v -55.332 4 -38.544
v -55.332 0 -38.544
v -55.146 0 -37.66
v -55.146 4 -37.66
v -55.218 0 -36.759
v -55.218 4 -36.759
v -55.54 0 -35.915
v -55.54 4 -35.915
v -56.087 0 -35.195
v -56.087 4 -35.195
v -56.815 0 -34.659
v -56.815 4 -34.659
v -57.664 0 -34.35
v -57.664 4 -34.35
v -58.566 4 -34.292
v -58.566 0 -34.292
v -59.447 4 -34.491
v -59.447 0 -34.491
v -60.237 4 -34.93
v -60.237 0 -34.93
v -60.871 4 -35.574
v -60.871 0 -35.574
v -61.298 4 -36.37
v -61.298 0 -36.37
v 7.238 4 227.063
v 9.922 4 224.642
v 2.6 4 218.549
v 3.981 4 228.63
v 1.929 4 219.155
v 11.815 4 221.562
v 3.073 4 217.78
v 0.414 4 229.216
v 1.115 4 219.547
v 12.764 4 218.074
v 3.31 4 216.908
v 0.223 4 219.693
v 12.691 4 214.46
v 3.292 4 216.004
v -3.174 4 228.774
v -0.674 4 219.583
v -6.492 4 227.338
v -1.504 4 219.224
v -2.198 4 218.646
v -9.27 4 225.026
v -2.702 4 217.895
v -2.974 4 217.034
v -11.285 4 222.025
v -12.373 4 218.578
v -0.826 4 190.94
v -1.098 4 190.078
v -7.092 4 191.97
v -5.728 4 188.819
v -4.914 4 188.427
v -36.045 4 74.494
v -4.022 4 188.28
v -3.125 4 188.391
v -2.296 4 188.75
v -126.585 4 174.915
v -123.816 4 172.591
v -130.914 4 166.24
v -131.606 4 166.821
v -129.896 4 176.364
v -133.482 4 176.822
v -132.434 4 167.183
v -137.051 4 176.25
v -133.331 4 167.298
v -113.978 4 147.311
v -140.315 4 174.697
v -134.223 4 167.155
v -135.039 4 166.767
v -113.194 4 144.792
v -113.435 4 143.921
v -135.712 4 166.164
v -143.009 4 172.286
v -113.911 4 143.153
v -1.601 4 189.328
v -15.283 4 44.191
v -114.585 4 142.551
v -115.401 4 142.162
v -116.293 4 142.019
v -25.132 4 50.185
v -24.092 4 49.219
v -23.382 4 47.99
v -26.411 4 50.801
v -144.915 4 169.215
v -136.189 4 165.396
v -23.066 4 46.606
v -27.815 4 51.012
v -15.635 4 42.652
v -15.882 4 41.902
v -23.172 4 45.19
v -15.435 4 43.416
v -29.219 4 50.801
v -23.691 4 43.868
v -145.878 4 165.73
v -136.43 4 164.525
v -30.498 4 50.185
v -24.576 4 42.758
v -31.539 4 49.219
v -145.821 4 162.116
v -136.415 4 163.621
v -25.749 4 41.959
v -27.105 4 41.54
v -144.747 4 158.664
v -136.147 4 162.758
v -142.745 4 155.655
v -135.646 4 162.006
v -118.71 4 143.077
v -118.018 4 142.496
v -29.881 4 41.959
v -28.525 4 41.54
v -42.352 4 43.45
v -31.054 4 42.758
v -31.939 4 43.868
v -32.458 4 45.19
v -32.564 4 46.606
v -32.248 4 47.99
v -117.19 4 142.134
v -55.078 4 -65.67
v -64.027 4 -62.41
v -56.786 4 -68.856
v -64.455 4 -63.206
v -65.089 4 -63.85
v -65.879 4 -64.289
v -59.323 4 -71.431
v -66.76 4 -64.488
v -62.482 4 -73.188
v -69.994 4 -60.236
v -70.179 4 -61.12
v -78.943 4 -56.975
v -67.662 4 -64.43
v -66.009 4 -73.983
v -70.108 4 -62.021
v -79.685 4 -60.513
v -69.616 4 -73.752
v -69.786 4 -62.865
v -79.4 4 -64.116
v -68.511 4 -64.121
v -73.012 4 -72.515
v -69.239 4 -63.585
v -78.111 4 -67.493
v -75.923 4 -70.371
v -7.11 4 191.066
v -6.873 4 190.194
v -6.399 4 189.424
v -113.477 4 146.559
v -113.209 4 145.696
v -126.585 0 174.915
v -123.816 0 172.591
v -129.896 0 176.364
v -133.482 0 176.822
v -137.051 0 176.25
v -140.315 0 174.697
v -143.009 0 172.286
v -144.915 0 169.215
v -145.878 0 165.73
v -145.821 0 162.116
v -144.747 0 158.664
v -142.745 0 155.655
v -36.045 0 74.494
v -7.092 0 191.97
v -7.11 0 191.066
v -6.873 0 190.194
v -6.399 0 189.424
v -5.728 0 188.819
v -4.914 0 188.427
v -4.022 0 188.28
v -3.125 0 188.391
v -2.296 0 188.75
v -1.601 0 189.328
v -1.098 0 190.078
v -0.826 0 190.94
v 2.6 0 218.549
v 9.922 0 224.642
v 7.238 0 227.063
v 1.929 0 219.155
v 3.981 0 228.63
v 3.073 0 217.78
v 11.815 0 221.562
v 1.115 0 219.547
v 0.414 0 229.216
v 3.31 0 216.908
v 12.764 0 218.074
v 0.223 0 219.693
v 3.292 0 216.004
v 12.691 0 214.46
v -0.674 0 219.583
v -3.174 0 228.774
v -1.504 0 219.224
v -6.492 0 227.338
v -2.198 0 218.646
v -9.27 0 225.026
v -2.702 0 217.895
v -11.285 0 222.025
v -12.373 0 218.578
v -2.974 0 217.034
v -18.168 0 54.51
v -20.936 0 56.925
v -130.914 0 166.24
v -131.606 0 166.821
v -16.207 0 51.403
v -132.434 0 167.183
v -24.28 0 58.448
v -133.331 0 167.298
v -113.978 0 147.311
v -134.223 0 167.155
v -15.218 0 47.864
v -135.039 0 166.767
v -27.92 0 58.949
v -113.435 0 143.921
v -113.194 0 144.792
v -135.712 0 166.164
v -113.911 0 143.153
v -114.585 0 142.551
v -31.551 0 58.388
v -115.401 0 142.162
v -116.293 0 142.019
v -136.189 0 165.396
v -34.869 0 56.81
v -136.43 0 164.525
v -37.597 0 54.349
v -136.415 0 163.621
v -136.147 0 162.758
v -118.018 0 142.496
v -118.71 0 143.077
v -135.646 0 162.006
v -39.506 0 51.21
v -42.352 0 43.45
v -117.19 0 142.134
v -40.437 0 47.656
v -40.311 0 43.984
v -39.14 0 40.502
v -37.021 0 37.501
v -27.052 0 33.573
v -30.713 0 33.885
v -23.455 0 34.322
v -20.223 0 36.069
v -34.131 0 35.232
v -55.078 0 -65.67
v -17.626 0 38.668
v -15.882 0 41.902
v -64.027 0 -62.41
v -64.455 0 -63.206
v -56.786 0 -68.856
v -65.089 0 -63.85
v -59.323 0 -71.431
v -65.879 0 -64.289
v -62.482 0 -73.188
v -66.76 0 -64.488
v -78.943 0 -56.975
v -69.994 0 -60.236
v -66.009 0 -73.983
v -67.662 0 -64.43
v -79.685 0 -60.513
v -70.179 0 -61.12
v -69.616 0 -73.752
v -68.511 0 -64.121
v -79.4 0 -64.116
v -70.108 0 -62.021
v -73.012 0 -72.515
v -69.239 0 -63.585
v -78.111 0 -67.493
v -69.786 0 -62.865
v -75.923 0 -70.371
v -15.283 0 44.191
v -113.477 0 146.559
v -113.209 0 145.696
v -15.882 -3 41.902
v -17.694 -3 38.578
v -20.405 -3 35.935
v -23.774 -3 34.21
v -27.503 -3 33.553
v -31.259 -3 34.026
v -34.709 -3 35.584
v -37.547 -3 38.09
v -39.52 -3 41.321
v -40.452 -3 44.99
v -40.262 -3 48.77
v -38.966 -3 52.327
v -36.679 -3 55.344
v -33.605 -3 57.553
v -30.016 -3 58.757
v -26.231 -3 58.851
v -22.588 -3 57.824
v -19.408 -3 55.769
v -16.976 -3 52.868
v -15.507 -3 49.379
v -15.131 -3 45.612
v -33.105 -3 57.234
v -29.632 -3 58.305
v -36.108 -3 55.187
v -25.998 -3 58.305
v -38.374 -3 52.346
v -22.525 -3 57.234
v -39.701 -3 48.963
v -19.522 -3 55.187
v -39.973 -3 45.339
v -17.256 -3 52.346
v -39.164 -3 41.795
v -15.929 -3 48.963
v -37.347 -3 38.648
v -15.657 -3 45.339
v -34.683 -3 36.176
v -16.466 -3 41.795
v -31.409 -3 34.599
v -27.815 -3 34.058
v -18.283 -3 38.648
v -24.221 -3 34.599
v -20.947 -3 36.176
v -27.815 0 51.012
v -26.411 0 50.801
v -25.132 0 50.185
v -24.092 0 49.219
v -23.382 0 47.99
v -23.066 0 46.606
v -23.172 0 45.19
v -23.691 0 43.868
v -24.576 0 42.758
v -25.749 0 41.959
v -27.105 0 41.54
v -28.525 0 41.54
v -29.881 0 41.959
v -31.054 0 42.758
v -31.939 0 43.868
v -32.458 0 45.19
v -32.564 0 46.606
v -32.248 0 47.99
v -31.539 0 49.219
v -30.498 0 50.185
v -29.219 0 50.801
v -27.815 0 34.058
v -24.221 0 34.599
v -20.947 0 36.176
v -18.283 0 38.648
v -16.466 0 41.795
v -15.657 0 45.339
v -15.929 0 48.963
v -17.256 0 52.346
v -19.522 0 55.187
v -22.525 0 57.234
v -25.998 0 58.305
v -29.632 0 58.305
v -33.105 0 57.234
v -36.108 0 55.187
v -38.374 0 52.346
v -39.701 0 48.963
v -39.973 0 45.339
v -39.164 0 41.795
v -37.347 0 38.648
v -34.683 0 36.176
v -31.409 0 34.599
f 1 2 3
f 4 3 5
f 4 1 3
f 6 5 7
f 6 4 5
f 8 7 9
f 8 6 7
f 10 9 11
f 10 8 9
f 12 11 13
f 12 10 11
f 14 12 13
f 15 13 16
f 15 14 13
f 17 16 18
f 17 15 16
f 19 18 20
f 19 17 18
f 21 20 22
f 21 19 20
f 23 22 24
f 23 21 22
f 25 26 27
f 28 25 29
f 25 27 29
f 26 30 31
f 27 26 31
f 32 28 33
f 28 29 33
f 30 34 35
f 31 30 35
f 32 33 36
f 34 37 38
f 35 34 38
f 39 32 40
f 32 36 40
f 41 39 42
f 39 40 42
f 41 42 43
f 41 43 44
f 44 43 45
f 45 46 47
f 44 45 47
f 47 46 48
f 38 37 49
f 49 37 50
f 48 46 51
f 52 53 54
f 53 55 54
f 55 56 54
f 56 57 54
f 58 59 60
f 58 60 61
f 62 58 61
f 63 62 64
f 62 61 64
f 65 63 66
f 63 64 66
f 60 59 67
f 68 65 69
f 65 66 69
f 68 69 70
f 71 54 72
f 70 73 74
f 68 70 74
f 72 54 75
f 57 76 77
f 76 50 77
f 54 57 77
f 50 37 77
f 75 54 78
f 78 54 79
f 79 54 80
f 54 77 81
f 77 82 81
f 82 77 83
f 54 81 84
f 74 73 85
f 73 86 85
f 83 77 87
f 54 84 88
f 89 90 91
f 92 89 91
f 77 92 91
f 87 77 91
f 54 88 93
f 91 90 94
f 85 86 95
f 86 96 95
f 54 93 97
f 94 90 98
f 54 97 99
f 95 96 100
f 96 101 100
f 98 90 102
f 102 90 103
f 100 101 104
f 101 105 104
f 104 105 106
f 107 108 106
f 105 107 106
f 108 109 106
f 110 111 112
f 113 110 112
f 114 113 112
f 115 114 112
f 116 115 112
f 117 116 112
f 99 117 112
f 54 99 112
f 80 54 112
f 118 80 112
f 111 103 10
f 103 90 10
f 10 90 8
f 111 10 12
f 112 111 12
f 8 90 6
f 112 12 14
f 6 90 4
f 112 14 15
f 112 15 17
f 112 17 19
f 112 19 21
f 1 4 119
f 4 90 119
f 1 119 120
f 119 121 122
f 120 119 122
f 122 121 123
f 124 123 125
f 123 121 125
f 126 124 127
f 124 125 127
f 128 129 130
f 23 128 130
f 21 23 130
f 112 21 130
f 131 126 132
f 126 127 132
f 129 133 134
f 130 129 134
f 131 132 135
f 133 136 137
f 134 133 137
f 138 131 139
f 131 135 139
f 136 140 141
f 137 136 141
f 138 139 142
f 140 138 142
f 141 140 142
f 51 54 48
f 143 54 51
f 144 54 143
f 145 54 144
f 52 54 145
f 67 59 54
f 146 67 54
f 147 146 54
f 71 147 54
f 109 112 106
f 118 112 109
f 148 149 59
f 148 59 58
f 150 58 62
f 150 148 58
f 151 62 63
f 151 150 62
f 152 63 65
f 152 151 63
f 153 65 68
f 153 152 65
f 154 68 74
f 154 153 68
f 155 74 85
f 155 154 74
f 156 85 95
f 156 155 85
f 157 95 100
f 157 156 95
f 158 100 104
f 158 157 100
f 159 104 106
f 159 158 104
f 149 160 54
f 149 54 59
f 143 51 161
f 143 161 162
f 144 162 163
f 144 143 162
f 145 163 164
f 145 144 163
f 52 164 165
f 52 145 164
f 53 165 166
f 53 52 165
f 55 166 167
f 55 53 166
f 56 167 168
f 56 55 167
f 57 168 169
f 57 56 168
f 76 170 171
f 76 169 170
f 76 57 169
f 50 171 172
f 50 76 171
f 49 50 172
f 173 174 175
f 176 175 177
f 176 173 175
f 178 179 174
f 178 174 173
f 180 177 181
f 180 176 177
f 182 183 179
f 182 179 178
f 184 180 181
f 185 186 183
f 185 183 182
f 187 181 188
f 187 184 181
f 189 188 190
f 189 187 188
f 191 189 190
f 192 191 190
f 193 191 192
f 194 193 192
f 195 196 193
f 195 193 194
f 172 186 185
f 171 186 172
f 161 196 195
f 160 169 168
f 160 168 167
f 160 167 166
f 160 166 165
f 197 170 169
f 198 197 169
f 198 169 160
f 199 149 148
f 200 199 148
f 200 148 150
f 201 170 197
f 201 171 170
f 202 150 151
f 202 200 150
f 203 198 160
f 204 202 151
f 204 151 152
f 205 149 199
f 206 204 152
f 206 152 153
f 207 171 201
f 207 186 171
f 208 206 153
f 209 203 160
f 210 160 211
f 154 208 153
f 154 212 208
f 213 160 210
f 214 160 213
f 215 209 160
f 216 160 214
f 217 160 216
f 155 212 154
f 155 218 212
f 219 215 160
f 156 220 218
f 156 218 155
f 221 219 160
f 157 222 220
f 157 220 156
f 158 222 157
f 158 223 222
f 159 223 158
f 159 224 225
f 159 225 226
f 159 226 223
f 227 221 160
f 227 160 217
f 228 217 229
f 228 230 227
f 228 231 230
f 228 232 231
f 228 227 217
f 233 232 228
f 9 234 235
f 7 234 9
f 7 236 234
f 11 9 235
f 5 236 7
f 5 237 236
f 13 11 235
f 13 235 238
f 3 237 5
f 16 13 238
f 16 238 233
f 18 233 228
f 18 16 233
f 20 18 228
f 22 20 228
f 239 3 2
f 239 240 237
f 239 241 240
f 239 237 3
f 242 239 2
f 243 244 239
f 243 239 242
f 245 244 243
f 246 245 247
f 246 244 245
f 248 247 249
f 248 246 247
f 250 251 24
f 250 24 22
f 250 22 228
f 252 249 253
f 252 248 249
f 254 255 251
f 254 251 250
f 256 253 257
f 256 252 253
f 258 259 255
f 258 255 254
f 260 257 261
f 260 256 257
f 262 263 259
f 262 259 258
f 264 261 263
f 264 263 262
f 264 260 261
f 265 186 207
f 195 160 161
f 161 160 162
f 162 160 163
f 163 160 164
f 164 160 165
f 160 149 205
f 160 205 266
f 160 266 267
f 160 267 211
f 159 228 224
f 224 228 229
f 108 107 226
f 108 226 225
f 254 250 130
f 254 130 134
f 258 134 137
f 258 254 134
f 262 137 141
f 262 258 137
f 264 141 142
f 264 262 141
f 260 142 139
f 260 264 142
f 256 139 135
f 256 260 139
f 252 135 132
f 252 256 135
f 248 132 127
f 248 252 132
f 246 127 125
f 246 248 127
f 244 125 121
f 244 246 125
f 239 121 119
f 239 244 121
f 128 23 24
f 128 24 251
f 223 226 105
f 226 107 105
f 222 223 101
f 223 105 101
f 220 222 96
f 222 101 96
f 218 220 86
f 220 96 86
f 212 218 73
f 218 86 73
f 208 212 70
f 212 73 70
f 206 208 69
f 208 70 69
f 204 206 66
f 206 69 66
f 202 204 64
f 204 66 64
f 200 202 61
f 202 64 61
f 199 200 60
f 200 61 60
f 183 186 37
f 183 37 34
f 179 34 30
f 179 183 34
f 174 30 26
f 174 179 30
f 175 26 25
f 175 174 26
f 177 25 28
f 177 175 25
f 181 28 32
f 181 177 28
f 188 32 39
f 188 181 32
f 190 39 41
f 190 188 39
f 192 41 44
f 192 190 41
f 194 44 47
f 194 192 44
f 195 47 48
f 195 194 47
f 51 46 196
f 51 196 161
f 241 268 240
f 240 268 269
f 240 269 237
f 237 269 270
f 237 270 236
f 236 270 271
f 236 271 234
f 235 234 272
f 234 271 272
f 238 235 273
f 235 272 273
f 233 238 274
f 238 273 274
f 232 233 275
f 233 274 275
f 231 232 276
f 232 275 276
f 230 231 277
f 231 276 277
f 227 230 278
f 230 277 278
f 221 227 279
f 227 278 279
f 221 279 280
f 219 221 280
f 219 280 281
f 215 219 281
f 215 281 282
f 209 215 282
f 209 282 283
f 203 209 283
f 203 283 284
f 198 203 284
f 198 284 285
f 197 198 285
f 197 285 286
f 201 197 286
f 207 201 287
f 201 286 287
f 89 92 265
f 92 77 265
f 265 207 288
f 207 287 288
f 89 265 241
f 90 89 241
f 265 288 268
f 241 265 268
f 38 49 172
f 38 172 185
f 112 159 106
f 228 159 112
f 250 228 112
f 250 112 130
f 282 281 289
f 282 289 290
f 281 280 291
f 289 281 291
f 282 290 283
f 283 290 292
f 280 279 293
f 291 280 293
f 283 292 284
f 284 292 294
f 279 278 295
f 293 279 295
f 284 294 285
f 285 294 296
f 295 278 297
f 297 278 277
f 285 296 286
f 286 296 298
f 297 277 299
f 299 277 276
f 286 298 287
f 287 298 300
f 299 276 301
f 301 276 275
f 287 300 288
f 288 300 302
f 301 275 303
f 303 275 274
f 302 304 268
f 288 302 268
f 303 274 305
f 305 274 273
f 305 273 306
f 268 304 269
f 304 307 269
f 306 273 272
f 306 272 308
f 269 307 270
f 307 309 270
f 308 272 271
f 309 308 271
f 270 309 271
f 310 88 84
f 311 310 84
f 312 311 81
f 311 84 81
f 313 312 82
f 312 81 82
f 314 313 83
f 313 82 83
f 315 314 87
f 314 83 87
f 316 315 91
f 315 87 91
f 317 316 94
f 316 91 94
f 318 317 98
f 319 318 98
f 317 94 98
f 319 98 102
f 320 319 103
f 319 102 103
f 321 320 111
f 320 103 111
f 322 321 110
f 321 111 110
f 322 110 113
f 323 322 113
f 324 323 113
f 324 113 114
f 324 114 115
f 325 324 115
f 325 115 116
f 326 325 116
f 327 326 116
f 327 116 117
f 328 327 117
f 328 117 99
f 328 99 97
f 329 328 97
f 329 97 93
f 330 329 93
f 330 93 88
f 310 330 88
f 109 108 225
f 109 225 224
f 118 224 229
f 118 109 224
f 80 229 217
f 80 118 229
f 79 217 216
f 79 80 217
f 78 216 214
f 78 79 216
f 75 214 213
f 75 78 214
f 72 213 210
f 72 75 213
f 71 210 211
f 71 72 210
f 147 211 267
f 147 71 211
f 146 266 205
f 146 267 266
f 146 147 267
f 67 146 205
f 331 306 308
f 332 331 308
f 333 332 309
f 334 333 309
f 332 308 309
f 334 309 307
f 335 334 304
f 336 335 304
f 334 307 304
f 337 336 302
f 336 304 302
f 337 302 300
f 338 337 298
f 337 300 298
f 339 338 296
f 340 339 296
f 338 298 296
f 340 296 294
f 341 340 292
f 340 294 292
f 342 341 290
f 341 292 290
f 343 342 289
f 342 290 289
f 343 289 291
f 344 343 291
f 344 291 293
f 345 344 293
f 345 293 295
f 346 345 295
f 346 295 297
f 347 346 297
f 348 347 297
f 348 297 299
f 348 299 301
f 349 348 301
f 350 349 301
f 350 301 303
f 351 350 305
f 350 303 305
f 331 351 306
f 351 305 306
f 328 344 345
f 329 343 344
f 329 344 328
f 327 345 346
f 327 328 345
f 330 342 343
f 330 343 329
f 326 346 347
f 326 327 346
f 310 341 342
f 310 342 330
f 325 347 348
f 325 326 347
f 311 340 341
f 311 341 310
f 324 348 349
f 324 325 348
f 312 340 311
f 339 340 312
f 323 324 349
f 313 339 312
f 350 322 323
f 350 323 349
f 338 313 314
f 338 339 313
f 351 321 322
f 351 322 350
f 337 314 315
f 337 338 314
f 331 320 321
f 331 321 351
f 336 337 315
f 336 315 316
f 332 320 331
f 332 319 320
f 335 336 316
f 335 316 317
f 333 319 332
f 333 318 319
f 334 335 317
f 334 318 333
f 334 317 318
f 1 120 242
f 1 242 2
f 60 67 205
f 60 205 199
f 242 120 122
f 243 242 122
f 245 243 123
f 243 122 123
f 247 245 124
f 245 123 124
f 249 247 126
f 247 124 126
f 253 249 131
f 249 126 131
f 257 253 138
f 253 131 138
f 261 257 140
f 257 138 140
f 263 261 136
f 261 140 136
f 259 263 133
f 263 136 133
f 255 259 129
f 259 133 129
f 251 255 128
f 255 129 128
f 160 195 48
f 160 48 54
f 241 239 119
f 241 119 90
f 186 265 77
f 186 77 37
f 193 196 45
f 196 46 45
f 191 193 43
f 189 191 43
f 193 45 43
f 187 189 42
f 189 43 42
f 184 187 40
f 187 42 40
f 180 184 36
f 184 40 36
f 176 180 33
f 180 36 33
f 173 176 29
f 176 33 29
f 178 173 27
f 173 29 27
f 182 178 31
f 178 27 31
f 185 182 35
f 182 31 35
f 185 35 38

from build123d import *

# Parameters (mm, degrees)
BOSS_EXTRUDE1_DEPTH = 4
BOSS_EXTRUDE2_START = -7
SKETCH3_R           = 12.7
BOSS_EXTRUDE2_DEPTH = 7
SKETCH5_R           = 4.7625
CUT_EXTRUDE1_DEPTH  = 272.846418627
SKETCH6_R           = 12.192
CUT_EXTRUDE2_DEPTH  = 3
SKETCH8_R           = 3.175
CUT_EXTRUDE3_DEPTH  = 272.846418627
CUT_EXTRUDE4_DEPTH  = 272.846418627


with BuildPart() as part:
    # Sketch1 → Boss-Extrude1 (new body)
    with BuildSketch(Plane(origin=(0, 0, 0), x_dir=(1, 0, 0), z_dir=(0, 1, 0))):
        with BuildLine():
            Line((-55.078065391, 65.670374736), (-15.882456002, -41.901827969))
            ThreePointArc((-15.882456002, -41.901827969), (-15.529329867, -43.032283758), (-15.283044075, -44.190718765))
            Line((-15.283044075, -44.190718765), (12.6911511, -214.459876374))
            ThreePointArc((12.6911511, -214.459876374), (2.218090383, -229.050798182), (-12.372831425, -218.577737465))
            Line((-12.372831425, -218.577737465), (-36.044890736, -74.494178583))
            Line((-36.044890736, -74.494178583), (-123.815593368, -172.591431542))
            ThreePointArc((-123.815593368, -172.591431542), (-141.748449811, -173.587754678), (-142.744772948, -155.654898235))
            Line((-142.744772948, -155.654898235), (-42.351793784, -43.450310863))
            Line((-42.351793784, -43.450310863), (-78.943224061, 56.974732054))
            ThreePointArc((-78.943224061, 56.974732054), (-71.358466067, 73.25513273), (-55.078065391, 65.670374736))
        make_face()
    extrude(amount=BOSS_EXTRUDE1_DEPTH)

    # Sketch3 → Boss-Extrude2 (add)
    with BuildSketch(Plane(origin=(0, 4, 0), x_dir=(1, 0, 0), z_dir=(0, 1, 0)).offset(BOSS_EXTRUDE2_START)):
        with Locations(Location((-27.815035337, -46.24964931, 0), (0, 0, 20.02))):
            Circle(SKETCH3_R)
    extrude(amount=BOSS_EXTRUDE2_DEPTH)

    # Sketch5 → Cut-Extrude1 (cut, through all)
    with BuildSketch(Plane(origin=(0, 4, 0), x_dir=(1, 0, 0), z_dir=(0, 1, 0))):
        with Locations(Location((-27.815035337, -46.24964931, 0), (0, 0, 270))):
            Circle(SKETCH5_R)
    extrude(amount=-CUT_EXTRUDE1_DEPTH, mode=Mode.SUBTRACT)

    # Sketch6 → Cut-Extrude2 (cut)
    with BuildSketch(Plane(origin=(0, -3, 0), x_dir=(-1, 0, 0), z_dir=(0, -1, 0))):
        with Locations(Location((27.815035337, -46.24964931, 0), (0, 0, 90))):
            Circle(SKETCH6_R)
    extrude(amount=-CUT_EXTRUDE2_DEPTH, mode=Mode.SUBTRACT)

    # Sketch8 → Cut-Extrude3 (cut, through all)
    with BuildSketch(Plane(origin=(0, 4, 0), x_dir=(1, 0, 0), z_dir=(0, 1, 0))):
        with Locations(Location((-67.010644726, 61.322553395, 0), (0, 0, 270))):
            Circle(SKETCH8_R)
        with Locations(Location((0.159159837, -216.518806919, 0), (0, 0, 270))):
            Circle(SKETCH8_R)
        with Locations(Location((-133.280183158, -164.123164888, 0), (0, 0, 270))):
            Circle(SKETCH8_R)
    extrude(amount=-CUT_EXTRUDE3_DEPTH, mode=Mode.SUBTRACT)

    # Sketch10 → Cut-Extrude4 (cut, through all)
    with BuildSketch(Plane(origin=(0, 4, 0), x_dir=(1, 0, 0), z_dir=(0, 1, 0))):
        with BuildLine():
            Line((-64.027499893, 62.40950873), (-55.331857211, 38.54435006))
            ThreePointArc((-55.331857211, 38.54435006), (-57.228046709, 34.474249891), (-61.298146878, 36.37043939))
            Line((-61.298146878, 36.37043939), (-69.99378956, 60.23559806))
            ThreePointArc((-69.99378956, 60.23559806), (-68.097600062, 64.305698229), (-64.027499893, 62.40950873))
        make_face()
        with BuildLine():
            Line((-135.646330605, -162.006098225), (-118.709797299, -143.076918645))
            ThreePointArc((-118.709797299, -143.076918645), (-114.226583188, -142.827837861), (-113.977502404, -147.311051972))
            Line((-113.977502404, -147.311051972), (-130.91403571, -166.240231552))
            ThreePointArc((-130.91403571, -166.240231552), (-135.397249821, -166.489312336), (-135.646330605, -162.006098225))
        make_face()
        with BuildLine():
            Line((-2.973837978, -217.033539556), (-7.091699069, -191.96955703))
            ThreePointArc((-7.091699069, -191.96955703), (-4.473433889, -188.321826578), (-0.825703437, -190.940091758))
            Line((-0.825703437, -190.940091758), (3.292157653, -216.004074283))
            ThreePointArc((3.292157653, -216.004074283), (0.673892474, -219.651804735), (-2.973837978, -217.033539556))
        make_face()
    extrude(amount=-CUT_EXTRUDE4_DEPTH, mode=Mode.SUBTRACT)


solid = part.part
